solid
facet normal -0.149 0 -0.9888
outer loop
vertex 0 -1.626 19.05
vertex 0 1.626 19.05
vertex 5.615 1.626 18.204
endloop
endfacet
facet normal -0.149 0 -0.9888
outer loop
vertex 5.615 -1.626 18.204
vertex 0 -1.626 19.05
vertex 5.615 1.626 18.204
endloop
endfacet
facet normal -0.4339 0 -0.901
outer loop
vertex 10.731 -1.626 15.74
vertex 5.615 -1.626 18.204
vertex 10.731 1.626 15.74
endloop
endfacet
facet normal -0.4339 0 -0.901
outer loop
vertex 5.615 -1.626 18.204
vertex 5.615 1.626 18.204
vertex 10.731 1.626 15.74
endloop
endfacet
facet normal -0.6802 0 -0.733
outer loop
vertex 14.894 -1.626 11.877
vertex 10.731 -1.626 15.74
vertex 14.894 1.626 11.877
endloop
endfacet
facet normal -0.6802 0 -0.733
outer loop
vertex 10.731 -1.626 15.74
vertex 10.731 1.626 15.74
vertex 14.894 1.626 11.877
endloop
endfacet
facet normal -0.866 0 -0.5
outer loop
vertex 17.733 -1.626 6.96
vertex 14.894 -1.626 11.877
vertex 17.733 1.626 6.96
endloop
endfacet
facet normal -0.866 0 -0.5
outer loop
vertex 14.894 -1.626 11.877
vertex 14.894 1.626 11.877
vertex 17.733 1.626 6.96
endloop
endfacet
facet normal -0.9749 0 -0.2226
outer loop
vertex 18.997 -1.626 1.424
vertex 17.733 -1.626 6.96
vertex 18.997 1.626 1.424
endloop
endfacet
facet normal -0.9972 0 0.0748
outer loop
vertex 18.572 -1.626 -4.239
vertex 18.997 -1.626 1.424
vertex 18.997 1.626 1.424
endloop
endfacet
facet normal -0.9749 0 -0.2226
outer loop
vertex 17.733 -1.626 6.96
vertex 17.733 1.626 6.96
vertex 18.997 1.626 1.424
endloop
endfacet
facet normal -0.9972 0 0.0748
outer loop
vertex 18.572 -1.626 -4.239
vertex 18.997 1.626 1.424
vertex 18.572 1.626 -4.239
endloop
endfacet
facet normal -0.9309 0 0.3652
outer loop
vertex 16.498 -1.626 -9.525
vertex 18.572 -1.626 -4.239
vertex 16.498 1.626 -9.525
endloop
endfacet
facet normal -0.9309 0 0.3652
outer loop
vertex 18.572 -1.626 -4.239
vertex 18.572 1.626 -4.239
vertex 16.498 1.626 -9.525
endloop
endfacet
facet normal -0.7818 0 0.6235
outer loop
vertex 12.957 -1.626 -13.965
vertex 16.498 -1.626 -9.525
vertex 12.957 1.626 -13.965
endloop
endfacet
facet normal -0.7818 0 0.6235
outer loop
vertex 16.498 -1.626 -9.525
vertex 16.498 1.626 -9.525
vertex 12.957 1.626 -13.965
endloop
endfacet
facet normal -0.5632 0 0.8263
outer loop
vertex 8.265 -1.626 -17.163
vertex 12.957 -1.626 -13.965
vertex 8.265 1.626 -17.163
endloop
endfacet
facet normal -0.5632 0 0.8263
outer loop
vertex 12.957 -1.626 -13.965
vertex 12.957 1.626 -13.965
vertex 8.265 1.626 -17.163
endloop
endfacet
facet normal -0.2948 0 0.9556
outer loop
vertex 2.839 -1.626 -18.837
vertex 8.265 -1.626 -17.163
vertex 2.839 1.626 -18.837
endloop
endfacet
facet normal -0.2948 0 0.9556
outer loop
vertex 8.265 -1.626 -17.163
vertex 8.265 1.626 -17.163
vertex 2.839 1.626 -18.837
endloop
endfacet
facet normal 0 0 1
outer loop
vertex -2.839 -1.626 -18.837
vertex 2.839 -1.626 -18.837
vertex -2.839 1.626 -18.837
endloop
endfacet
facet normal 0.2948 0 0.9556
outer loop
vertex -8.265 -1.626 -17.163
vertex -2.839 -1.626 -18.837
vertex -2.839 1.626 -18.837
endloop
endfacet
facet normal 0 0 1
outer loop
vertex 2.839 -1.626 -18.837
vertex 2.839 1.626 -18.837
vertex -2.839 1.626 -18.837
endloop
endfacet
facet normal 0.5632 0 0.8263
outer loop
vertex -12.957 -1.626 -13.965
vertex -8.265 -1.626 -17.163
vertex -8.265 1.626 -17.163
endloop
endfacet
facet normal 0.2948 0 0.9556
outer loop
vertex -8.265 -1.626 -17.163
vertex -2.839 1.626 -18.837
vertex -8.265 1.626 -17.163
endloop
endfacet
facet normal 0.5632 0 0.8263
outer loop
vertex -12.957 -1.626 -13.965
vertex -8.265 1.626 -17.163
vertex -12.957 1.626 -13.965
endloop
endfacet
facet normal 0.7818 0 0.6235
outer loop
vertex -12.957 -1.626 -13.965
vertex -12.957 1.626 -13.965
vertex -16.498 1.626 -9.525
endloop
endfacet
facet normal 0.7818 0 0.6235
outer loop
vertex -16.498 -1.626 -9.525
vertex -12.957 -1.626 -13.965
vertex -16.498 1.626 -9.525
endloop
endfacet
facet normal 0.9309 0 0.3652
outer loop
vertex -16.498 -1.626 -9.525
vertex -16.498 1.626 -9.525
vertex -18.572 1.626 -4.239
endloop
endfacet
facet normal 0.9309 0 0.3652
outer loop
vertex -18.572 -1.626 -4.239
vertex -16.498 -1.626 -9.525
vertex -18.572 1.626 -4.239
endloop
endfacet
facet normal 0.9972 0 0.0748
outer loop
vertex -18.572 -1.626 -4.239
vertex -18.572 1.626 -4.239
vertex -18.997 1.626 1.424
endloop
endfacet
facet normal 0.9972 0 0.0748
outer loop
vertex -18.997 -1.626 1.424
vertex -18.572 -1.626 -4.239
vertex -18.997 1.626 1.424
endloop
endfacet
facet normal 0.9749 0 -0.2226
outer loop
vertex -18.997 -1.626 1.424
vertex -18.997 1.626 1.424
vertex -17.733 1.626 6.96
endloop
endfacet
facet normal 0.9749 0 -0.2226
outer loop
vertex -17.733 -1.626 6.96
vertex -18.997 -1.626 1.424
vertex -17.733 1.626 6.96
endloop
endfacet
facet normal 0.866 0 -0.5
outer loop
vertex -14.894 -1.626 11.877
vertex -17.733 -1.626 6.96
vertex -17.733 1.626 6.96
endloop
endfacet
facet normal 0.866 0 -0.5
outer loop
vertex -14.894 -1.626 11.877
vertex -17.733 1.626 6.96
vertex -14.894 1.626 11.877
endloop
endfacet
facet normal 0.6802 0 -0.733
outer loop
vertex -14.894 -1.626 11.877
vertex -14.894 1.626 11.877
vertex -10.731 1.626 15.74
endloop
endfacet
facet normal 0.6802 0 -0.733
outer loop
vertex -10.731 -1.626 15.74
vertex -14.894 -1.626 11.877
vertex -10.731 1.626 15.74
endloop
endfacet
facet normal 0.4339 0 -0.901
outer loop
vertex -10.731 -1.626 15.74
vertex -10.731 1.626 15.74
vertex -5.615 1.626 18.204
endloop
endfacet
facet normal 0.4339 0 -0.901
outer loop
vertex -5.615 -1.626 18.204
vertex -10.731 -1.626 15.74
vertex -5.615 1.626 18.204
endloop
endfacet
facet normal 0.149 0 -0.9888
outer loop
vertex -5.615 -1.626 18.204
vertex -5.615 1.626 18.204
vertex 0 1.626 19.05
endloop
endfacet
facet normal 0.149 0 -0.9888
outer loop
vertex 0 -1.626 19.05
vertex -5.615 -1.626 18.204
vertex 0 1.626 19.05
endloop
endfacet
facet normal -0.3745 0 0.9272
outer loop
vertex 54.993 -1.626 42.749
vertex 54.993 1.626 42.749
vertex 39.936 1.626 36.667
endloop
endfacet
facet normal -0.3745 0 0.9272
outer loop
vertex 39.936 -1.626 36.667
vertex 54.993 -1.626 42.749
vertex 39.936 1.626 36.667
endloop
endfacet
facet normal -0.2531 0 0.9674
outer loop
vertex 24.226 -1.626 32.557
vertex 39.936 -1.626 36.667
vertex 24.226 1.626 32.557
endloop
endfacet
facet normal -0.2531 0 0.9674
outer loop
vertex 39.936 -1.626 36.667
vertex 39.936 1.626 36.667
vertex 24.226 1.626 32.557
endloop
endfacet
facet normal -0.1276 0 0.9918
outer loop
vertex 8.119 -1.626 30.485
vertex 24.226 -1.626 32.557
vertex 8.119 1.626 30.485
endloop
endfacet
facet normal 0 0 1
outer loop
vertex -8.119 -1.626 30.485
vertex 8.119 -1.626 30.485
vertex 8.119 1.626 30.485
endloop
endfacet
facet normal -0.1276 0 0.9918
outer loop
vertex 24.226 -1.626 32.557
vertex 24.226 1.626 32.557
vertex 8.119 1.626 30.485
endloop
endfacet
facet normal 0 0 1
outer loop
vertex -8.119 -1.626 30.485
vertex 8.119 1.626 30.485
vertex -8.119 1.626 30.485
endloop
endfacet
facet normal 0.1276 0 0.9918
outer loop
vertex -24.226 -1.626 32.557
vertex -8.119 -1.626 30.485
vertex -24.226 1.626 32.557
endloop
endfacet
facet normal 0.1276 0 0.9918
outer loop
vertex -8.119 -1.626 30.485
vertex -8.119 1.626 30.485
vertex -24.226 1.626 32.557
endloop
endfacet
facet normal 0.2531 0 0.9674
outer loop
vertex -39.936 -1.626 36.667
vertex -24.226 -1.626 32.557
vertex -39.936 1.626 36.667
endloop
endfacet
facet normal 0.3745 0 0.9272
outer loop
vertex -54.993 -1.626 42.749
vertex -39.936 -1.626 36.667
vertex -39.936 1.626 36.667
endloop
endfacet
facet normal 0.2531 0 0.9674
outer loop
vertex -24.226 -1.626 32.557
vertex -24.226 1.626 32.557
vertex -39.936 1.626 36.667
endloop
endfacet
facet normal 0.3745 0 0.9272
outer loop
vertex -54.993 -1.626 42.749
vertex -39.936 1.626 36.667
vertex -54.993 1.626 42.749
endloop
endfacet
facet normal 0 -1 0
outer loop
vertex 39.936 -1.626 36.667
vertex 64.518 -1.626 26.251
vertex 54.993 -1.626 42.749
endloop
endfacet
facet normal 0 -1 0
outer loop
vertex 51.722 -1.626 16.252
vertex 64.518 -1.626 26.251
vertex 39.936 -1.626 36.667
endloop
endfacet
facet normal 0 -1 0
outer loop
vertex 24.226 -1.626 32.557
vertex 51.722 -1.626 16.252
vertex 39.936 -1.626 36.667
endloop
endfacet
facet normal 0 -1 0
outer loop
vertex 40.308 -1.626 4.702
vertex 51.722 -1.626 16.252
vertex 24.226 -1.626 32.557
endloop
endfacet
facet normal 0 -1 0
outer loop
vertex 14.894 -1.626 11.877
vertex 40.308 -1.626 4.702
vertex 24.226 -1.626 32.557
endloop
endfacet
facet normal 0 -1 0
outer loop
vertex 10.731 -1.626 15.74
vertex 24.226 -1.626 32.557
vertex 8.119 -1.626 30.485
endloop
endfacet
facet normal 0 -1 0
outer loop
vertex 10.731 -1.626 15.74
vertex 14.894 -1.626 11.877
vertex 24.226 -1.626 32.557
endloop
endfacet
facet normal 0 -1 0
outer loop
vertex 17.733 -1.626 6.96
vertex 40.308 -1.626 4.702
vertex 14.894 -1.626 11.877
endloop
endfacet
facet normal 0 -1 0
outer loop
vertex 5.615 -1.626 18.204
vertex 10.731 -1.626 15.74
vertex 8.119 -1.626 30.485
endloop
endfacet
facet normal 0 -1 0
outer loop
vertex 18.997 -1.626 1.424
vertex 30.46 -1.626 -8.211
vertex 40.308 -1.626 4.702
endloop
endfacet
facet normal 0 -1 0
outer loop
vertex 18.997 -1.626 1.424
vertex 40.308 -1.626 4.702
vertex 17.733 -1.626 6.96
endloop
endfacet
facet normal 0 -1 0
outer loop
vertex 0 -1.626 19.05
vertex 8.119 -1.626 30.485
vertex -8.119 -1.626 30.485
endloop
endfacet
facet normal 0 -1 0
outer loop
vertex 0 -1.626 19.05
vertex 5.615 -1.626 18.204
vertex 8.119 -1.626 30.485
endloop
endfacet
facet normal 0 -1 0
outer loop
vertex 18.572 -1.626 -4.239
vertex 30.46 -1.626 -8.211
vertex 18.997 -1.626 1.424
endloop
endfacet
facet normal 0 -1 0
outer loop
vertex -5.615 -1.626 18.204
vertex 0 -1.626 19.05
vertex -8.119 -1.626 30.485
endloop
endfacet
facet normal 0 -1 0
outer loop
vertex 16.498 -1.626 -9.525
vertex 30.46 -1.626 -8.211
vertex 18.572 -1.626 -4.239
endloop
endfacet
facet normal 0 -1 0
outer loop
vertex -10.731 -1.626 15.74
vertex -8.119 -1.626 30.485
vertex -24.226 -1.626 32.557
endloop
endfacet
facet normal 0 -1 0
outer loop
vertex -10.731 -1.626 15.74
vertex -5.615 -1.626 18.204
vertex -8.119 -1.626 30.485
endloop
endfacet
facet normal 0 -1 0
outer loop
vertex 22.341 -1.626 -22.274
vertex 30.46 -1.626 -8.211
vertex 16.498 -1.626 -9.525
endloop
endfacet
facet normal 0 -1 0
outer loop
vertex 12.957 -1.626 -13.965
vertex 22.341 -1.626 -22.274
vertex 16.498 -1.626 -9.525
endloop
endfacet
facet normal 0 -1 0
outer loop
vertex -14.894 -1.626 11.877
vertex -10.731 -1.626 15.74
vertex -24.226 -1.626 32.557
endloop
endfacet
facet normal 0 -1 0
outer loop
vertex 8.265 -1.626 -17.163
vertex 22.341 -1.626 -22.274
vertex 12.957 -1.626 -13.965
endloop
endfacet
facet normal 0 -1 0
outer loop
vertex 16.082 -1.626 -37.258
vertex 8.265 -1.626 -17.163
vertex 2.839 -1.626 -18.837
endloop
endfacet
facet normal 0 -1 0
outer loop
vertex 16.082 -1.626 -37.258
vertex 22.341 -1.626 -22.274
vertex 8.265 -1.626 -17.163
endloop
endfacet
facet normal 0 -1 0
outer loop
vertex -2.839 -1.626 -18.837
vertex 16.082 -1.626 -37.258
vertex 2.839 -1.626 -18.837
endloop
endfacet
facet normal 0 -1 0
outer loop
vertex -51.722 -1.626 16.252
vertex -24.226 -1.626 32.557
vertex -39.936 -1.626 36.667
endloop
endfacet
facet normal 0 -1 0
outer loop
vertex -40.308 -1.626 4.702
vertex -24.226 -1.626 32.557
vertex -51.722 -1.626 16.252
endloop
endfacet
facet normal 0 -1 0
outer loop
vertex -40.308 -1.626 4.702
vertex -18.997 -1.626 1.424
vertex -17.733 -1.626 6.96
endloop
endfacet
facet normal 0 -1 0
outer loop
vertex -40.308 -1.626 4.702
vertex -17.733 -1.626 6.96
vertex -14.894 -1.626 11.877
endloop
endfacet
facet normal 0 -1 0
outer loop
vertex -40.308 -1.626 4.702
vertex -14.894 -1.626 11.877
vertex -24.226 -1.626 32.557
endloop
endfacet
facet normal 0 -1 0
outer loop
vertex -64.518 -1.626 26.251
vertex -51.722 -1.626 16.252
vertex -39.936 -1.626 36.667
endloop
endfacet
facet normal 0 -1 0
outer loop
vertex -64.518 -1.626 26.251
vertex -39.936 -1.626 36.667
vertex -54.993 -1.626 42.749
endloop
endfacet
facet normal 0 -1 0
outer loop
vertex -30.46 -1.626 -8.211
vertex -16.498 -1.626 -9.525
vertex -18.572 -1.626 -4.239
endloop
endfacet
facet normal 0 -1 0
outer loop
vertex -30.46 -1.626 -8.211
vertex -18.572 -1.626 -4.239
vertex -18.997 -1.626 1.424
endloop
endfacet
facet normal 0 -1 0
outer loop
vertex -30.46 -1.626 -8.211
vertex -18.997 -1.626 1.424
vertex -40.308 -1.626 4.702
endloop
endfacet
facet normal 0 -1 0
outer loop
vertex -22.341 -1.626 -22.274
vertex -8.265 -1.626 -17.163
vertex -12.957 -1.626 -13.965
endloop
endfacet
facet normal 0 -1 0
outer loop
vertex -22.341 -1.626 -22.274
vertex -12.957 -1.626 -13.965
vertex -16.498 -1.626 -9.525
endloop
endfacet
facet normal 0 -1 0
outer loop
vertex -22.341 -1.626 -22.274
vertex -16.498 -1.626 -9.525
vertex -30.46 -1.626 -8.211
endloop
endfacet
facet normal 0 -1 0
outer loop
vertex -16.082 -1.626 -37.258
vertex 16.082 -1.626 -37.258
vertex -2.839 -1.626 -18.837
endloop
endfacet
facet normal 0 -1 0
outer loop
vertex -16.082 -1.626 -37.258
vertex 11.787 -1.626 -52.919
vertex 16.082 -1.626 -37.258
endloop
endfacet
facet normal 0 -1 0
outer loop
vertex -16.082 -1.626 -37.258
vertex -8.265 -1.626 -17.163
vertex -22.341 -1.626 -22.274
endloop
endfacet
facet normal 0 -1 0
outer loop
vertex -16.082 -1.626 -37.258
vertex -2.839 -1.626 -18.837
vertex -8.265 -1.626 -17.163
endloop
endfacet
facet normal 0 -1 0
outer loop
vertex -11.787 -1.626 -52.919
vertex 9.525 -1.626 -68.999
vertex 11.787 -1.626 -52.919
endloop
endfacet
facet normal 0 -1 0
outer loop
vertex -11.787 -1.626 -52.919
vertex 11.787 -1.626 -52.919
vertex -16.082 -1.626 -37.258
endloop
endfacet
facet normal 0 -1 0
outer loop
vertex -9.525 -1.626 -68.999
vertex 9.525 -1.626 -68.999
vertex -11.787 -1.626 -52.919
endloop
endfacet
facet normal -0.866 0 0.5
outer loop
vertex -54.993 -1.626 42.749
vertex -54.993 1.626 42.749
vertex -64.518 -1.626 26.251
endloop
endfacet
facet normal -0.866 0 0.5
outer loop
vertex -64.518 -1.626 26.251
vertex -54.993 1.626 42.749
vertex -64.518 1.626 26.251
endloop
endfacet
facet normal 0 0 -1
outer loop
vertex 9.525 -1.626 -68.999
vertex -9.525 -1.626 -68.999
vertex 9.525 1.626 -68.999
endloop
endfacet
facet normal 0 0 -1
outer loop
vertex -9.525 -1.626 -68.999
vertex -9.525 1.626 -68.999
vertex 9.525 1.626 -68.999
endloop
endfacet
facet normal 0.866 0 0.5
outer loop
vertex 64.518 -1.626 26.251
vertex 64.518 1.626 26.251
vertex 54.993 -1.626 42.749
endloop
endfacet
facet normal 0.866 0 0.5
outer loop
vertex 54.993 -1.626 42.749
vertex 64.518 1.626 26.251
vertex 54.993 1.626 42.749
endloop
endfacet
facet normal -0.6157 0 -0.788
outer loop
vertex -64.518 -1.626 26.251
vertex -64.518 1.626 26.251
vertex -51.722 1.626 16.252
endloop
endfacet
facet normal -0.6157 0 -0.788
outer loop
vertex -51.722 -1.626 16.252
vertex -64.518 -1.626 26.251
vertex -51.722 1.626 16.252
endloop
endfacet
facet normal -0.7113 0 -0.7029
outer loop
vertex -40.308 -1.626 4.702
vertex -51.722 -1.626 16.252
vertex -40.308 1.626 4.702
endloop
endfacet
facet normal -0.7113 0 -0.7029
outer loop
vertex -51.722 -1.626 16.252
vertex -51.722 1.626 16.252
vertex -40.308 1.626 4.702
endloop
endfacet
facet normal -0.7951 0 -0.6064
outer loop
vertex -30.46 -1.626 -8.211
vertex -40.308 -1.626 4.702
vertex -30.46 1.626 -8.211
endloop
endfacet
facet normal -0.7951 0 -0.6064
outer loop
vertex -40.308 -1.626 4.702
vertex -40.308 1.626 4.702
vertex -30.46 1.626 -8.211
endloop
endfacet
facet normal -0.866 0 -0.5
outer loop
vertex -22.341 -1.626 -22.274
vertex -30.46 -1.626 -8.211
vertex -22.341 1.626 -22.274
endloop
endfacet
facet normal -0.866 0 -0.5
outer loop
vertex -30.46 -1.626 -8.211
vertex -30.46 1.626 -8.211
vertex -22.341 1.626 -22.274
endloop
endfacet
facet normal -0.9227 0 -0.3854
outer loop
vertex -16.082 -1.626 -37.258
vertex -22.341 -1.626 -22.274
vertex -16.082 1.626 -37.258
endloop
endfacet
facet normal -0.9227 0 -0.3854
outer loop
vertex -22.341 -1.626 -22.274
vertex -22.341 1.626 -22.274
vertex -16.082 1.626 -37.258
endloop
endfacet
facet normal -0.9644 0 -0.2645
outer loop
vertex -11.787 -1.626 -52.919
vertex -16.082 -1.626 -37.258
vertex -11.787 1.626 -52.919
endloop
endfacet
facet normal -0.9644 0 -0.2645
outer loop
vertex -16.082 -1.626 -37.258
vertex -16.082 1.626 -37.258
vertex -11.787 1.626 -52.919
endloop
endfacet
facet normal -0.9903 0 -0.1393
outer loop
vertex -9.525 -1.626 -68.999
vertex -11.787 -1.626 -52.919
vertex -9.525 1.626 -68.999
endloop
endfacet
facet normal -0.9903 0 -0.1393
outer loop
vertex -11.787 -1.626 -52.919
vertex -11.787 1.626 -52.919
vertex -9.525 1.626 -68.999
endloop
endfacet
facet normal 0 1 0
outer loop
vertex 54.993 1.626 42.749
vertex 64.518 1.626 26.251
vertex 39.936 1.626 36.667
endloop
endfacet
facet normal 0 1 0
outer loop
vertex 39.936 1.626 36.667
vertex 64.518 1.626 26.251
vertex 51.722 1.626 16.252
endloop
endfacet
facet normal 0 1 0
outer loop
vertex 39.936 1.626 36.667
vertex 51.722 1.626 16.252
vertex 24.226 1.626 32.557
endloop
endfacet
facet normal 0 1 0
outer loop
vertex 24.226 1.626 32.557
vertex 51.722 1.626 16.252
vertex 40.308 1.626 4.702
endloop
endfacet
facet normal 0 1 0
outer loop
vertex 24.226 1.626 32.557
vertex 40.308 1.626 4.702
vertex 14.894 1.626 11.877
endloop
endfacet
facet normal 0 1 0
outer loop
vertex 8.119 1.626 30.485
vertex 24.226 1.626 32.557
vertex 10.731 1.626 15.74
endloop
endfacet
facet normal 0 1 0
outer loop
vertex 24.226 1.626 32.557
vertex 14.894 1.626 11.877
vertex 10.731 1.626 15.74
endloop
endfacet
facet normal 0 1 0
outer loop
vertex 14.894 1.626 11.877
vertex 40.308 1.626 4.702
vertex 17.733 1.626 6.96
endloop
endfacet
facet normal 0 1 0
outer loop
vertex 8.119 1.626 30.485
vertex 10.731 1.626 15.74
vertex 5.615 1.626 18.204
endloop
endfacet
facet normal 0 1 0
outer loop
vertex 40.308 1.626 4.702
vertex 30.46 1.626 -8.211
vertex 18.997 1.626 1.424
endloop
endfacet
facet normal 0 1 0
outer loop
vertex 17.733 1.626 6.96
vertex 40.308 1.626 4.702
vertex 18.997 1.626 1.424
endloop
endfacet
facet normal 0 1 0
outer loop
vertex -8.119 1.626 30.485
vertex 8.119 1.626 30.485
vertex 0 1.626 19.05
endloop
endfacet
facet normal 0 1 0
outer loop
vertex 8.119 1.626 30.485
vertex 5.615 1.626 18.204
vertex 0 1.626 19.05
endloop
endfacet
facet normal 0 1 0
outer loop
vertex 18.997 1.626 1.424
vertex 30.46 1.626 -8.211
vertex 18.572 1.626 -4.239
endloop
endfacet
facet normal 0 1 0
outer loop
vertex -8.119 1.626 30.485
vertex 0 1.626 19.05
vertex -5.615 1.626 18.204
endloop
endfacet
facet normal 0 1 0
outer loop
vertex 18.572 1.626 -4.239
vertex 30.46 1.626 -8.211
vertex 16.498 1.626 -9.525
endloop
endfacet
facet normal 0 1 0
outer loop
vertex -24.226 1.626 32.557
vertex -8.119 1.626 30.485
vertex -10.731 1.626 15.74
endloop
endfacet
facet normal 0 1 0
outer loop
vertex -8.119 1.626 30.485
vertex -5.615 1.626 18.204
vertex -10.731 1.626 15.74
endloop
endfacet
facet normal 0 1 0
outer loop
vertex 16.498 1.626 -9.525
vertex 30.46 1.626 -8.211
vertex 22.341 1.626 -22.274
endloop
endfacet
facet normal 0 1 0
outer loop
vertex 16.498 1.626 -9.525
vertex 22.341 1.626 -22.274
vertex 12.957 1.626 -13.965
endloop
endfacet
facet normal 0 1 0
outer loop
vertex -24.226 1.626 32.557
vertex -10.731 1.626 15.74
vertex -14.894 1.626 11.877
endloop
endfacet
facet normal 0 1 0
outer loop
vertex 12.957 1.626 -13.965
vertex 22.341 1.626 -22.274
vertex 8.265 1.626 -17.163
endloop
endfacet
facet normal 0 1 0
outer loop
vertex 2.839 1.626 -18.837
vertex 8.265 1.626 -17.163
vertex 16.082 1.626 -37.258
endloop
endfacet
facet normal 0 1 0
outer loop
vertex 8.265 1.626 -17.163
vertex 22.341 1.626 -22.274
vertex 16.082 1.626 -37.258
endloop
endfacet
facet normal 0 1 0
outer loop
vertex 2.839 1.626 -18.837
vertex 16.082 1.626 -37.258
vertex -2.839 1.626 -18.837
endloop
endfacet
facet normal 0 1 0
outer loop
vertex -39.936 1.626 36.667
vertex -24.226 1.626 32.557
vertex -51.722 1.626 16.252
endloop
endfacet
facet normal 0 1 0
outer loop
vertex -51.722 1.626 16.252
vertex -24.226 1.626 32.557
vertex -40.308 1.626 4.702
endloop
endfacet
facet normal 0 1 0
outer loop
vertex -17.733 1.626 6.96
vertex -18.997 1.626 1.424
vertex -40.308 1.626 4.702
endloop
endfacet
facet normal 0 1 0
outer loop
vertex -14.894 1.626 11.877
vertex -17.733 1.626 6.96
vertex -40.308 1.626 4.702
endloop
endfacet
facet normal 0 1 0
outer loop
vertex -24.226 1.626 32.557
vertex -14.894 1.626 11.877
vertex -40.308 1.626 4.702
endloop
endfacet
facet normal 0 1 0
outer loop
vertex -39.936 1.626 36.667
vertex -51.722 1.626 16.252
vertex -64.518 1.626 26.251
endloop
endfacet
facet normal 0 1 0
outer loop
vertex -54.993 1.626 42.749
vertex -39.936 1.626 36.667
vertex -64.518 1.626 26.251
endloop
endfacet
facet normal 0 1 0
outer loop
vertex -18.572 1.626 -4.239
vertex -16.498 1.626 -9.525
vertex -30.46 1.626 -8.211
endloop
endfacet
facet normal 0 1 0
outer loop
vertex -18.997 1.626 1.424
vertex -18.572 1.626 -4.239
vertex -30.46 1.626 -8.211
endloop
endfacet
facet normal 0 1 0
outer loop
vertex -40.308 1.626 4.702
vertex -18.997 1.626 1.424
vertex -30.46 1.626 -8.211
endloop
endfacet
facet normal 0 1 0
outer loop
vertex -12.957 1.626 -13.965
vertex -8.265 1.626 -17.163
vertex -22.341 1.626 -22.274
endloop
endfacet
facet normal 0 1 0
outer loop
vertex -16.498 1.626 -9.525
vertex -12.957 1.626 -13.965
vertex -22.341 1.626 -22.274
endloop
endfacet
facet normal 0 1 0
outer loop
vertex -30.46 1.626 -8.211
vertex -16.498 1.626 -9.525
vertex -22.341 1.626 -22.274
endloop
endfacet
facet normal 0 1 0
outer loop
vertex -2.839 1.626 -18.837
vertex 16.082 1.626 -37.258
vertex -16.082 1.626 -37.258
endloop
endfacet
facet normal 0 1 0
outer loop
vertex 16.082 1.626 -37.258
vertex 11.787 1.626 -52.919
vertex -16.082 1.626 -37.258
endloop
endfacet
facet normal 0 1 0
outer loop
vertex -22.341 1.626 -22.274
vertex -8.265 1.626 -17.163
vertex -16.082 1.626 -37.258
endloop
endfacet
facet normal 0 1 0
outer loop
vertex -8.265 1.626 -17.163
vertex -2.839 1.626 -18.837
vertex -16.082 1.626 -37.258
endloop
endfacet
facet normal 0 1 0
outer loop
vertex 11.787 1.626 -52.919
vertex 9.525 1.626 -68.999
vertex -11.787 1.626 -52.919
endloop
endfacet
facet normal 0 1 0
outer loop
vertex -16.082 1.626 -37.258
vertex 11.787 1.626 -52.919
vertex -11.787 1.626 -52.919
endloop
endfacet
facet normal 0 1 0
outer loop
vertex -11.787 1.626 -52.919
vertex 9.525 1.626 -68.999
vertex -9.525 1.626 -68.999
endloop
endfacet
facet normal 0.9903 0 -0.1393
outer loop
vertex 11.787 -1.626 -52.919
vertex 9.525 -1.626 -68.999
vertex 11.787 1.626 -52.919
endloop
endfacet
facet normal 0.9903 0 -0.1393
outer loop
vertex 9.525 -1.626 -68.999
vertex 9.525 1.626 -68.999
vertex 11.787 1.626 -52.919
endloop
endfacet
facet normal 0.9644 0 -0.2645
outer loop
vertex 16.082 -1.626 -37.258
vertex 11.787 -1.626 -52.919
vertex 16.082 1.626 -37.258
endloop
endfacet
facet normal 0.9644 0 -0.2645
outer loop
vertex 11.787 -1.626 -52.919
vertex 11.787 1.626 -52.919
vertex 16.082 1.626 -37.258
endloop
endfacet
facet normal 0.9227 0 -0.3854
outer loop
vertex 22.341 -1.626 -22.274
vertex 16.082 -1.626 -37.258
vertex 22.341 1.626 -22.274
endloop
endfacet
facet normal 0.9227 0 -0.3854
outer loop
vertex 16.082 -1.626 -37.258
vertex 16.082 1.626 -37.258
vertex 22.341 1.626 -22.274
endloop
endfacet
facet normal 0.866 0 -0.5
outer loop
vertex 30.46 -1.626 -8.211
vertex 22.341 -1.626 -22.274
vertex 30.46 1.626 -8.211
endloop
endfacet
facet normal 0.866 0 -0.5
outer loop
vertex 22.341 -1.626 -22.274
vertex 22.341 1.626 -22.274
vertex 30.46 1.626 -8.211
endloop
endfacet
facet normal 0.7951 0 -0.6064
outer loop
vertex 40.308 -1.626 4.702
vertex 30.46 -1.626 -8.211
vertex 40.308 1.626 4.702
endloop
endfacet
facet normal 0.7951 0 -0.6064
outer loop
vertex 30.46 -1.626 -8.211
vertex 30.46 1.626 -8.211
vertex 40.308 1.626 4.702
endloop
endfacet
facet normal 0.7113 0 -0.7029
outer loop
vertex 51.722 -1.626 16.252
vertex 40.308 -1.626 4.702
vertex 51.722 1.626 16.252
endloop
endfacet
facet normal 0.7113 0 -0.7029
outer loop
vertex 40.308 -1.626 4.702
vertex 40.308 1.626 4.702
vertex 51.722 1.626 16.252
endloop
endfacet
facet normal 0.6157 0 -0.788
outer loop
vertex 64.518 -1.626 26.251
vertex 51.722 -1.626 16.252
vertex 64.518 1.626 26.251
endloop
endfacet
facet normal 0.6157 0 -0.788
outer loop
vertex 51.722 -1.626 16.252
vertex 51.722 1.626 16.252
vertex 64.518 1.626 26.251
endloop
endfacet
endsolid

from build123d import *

# Parameters (mm, degrees)
BOSS_EXTRUDE1_DEPTH = 1.6256
SKETCH3_R           = 19.05
CUT_EXTRUDE2_DEPTH  = 95.519790354


with BuildPart() as part:
    # Sketch1 → Boss-Extrude1 (new, symmetric)
    with BuildSketch(Plane(origin=(0, 0, 0), x_dir=(1, 0, 0), z_dir=(0, 1, 0))):
        with BuildLine():
            ThreePointArc((-64.51761314, -26.250738686), (-26.175423514, 15.112387812), (-9.525, 68.999261314))
            Line((-9.525, 68.999261314), (-9.525, 5.499261314))
            Line((-9.525, 5.499261314), (-64.51761314, -26.250738686))
        make_face()
        Polygon((-9.525, 5.499261314), (-9.525, 68.999261314), (9.525, 68.999261314), (9.525, 5.499261314), (64.51761314, -26.250738686), (54.99261314, -42.748522628), (0, -10.998522628), (-54.99261314, -42.748522628), (-64.51761314, -26.250738686), align=None)
        with BuildLine():
            ThreePointArc((54.99261314, -42.748522628), (0, -30.224775624), (-54.99261314, -42.748522628))
            Line((-54.99261314, -42.748522628), (0, -10.998522628))
            Line((0, -10.998522628), (54.99261314, -42.748522628))
        make_face()
        with BuildLine():
            ThreePointArc((9.525, 68.999261314), (26.175423514, 15.112387812), (64.51761314, -26.250738686))
            Line((64.51761314, -26.250738686), (9.525, 5.499261314))
            Line((9.525, 5.499261314), (9.525, 68.999261314))
        make_face()
    extrude(amount=BOSS_EXTRUDE1_DEPTH, both=True)

    # Sketch3 → Cut-Extrude2 (cut, through all)
    with BuildSketch(Plane(origin=(0, 1.6256, 0), x_dir=(1, 0, 0), z_dir=(0, 1, 0))):
        with Locations(Location((0, 0, 0), (0, 0, 270))):
            Circle(SKETCH3_R)
    extrude(amount=-CUT_EXTRUDE2_DEPTH, mode=Mode.SUBTRACT)


solid = part.part
